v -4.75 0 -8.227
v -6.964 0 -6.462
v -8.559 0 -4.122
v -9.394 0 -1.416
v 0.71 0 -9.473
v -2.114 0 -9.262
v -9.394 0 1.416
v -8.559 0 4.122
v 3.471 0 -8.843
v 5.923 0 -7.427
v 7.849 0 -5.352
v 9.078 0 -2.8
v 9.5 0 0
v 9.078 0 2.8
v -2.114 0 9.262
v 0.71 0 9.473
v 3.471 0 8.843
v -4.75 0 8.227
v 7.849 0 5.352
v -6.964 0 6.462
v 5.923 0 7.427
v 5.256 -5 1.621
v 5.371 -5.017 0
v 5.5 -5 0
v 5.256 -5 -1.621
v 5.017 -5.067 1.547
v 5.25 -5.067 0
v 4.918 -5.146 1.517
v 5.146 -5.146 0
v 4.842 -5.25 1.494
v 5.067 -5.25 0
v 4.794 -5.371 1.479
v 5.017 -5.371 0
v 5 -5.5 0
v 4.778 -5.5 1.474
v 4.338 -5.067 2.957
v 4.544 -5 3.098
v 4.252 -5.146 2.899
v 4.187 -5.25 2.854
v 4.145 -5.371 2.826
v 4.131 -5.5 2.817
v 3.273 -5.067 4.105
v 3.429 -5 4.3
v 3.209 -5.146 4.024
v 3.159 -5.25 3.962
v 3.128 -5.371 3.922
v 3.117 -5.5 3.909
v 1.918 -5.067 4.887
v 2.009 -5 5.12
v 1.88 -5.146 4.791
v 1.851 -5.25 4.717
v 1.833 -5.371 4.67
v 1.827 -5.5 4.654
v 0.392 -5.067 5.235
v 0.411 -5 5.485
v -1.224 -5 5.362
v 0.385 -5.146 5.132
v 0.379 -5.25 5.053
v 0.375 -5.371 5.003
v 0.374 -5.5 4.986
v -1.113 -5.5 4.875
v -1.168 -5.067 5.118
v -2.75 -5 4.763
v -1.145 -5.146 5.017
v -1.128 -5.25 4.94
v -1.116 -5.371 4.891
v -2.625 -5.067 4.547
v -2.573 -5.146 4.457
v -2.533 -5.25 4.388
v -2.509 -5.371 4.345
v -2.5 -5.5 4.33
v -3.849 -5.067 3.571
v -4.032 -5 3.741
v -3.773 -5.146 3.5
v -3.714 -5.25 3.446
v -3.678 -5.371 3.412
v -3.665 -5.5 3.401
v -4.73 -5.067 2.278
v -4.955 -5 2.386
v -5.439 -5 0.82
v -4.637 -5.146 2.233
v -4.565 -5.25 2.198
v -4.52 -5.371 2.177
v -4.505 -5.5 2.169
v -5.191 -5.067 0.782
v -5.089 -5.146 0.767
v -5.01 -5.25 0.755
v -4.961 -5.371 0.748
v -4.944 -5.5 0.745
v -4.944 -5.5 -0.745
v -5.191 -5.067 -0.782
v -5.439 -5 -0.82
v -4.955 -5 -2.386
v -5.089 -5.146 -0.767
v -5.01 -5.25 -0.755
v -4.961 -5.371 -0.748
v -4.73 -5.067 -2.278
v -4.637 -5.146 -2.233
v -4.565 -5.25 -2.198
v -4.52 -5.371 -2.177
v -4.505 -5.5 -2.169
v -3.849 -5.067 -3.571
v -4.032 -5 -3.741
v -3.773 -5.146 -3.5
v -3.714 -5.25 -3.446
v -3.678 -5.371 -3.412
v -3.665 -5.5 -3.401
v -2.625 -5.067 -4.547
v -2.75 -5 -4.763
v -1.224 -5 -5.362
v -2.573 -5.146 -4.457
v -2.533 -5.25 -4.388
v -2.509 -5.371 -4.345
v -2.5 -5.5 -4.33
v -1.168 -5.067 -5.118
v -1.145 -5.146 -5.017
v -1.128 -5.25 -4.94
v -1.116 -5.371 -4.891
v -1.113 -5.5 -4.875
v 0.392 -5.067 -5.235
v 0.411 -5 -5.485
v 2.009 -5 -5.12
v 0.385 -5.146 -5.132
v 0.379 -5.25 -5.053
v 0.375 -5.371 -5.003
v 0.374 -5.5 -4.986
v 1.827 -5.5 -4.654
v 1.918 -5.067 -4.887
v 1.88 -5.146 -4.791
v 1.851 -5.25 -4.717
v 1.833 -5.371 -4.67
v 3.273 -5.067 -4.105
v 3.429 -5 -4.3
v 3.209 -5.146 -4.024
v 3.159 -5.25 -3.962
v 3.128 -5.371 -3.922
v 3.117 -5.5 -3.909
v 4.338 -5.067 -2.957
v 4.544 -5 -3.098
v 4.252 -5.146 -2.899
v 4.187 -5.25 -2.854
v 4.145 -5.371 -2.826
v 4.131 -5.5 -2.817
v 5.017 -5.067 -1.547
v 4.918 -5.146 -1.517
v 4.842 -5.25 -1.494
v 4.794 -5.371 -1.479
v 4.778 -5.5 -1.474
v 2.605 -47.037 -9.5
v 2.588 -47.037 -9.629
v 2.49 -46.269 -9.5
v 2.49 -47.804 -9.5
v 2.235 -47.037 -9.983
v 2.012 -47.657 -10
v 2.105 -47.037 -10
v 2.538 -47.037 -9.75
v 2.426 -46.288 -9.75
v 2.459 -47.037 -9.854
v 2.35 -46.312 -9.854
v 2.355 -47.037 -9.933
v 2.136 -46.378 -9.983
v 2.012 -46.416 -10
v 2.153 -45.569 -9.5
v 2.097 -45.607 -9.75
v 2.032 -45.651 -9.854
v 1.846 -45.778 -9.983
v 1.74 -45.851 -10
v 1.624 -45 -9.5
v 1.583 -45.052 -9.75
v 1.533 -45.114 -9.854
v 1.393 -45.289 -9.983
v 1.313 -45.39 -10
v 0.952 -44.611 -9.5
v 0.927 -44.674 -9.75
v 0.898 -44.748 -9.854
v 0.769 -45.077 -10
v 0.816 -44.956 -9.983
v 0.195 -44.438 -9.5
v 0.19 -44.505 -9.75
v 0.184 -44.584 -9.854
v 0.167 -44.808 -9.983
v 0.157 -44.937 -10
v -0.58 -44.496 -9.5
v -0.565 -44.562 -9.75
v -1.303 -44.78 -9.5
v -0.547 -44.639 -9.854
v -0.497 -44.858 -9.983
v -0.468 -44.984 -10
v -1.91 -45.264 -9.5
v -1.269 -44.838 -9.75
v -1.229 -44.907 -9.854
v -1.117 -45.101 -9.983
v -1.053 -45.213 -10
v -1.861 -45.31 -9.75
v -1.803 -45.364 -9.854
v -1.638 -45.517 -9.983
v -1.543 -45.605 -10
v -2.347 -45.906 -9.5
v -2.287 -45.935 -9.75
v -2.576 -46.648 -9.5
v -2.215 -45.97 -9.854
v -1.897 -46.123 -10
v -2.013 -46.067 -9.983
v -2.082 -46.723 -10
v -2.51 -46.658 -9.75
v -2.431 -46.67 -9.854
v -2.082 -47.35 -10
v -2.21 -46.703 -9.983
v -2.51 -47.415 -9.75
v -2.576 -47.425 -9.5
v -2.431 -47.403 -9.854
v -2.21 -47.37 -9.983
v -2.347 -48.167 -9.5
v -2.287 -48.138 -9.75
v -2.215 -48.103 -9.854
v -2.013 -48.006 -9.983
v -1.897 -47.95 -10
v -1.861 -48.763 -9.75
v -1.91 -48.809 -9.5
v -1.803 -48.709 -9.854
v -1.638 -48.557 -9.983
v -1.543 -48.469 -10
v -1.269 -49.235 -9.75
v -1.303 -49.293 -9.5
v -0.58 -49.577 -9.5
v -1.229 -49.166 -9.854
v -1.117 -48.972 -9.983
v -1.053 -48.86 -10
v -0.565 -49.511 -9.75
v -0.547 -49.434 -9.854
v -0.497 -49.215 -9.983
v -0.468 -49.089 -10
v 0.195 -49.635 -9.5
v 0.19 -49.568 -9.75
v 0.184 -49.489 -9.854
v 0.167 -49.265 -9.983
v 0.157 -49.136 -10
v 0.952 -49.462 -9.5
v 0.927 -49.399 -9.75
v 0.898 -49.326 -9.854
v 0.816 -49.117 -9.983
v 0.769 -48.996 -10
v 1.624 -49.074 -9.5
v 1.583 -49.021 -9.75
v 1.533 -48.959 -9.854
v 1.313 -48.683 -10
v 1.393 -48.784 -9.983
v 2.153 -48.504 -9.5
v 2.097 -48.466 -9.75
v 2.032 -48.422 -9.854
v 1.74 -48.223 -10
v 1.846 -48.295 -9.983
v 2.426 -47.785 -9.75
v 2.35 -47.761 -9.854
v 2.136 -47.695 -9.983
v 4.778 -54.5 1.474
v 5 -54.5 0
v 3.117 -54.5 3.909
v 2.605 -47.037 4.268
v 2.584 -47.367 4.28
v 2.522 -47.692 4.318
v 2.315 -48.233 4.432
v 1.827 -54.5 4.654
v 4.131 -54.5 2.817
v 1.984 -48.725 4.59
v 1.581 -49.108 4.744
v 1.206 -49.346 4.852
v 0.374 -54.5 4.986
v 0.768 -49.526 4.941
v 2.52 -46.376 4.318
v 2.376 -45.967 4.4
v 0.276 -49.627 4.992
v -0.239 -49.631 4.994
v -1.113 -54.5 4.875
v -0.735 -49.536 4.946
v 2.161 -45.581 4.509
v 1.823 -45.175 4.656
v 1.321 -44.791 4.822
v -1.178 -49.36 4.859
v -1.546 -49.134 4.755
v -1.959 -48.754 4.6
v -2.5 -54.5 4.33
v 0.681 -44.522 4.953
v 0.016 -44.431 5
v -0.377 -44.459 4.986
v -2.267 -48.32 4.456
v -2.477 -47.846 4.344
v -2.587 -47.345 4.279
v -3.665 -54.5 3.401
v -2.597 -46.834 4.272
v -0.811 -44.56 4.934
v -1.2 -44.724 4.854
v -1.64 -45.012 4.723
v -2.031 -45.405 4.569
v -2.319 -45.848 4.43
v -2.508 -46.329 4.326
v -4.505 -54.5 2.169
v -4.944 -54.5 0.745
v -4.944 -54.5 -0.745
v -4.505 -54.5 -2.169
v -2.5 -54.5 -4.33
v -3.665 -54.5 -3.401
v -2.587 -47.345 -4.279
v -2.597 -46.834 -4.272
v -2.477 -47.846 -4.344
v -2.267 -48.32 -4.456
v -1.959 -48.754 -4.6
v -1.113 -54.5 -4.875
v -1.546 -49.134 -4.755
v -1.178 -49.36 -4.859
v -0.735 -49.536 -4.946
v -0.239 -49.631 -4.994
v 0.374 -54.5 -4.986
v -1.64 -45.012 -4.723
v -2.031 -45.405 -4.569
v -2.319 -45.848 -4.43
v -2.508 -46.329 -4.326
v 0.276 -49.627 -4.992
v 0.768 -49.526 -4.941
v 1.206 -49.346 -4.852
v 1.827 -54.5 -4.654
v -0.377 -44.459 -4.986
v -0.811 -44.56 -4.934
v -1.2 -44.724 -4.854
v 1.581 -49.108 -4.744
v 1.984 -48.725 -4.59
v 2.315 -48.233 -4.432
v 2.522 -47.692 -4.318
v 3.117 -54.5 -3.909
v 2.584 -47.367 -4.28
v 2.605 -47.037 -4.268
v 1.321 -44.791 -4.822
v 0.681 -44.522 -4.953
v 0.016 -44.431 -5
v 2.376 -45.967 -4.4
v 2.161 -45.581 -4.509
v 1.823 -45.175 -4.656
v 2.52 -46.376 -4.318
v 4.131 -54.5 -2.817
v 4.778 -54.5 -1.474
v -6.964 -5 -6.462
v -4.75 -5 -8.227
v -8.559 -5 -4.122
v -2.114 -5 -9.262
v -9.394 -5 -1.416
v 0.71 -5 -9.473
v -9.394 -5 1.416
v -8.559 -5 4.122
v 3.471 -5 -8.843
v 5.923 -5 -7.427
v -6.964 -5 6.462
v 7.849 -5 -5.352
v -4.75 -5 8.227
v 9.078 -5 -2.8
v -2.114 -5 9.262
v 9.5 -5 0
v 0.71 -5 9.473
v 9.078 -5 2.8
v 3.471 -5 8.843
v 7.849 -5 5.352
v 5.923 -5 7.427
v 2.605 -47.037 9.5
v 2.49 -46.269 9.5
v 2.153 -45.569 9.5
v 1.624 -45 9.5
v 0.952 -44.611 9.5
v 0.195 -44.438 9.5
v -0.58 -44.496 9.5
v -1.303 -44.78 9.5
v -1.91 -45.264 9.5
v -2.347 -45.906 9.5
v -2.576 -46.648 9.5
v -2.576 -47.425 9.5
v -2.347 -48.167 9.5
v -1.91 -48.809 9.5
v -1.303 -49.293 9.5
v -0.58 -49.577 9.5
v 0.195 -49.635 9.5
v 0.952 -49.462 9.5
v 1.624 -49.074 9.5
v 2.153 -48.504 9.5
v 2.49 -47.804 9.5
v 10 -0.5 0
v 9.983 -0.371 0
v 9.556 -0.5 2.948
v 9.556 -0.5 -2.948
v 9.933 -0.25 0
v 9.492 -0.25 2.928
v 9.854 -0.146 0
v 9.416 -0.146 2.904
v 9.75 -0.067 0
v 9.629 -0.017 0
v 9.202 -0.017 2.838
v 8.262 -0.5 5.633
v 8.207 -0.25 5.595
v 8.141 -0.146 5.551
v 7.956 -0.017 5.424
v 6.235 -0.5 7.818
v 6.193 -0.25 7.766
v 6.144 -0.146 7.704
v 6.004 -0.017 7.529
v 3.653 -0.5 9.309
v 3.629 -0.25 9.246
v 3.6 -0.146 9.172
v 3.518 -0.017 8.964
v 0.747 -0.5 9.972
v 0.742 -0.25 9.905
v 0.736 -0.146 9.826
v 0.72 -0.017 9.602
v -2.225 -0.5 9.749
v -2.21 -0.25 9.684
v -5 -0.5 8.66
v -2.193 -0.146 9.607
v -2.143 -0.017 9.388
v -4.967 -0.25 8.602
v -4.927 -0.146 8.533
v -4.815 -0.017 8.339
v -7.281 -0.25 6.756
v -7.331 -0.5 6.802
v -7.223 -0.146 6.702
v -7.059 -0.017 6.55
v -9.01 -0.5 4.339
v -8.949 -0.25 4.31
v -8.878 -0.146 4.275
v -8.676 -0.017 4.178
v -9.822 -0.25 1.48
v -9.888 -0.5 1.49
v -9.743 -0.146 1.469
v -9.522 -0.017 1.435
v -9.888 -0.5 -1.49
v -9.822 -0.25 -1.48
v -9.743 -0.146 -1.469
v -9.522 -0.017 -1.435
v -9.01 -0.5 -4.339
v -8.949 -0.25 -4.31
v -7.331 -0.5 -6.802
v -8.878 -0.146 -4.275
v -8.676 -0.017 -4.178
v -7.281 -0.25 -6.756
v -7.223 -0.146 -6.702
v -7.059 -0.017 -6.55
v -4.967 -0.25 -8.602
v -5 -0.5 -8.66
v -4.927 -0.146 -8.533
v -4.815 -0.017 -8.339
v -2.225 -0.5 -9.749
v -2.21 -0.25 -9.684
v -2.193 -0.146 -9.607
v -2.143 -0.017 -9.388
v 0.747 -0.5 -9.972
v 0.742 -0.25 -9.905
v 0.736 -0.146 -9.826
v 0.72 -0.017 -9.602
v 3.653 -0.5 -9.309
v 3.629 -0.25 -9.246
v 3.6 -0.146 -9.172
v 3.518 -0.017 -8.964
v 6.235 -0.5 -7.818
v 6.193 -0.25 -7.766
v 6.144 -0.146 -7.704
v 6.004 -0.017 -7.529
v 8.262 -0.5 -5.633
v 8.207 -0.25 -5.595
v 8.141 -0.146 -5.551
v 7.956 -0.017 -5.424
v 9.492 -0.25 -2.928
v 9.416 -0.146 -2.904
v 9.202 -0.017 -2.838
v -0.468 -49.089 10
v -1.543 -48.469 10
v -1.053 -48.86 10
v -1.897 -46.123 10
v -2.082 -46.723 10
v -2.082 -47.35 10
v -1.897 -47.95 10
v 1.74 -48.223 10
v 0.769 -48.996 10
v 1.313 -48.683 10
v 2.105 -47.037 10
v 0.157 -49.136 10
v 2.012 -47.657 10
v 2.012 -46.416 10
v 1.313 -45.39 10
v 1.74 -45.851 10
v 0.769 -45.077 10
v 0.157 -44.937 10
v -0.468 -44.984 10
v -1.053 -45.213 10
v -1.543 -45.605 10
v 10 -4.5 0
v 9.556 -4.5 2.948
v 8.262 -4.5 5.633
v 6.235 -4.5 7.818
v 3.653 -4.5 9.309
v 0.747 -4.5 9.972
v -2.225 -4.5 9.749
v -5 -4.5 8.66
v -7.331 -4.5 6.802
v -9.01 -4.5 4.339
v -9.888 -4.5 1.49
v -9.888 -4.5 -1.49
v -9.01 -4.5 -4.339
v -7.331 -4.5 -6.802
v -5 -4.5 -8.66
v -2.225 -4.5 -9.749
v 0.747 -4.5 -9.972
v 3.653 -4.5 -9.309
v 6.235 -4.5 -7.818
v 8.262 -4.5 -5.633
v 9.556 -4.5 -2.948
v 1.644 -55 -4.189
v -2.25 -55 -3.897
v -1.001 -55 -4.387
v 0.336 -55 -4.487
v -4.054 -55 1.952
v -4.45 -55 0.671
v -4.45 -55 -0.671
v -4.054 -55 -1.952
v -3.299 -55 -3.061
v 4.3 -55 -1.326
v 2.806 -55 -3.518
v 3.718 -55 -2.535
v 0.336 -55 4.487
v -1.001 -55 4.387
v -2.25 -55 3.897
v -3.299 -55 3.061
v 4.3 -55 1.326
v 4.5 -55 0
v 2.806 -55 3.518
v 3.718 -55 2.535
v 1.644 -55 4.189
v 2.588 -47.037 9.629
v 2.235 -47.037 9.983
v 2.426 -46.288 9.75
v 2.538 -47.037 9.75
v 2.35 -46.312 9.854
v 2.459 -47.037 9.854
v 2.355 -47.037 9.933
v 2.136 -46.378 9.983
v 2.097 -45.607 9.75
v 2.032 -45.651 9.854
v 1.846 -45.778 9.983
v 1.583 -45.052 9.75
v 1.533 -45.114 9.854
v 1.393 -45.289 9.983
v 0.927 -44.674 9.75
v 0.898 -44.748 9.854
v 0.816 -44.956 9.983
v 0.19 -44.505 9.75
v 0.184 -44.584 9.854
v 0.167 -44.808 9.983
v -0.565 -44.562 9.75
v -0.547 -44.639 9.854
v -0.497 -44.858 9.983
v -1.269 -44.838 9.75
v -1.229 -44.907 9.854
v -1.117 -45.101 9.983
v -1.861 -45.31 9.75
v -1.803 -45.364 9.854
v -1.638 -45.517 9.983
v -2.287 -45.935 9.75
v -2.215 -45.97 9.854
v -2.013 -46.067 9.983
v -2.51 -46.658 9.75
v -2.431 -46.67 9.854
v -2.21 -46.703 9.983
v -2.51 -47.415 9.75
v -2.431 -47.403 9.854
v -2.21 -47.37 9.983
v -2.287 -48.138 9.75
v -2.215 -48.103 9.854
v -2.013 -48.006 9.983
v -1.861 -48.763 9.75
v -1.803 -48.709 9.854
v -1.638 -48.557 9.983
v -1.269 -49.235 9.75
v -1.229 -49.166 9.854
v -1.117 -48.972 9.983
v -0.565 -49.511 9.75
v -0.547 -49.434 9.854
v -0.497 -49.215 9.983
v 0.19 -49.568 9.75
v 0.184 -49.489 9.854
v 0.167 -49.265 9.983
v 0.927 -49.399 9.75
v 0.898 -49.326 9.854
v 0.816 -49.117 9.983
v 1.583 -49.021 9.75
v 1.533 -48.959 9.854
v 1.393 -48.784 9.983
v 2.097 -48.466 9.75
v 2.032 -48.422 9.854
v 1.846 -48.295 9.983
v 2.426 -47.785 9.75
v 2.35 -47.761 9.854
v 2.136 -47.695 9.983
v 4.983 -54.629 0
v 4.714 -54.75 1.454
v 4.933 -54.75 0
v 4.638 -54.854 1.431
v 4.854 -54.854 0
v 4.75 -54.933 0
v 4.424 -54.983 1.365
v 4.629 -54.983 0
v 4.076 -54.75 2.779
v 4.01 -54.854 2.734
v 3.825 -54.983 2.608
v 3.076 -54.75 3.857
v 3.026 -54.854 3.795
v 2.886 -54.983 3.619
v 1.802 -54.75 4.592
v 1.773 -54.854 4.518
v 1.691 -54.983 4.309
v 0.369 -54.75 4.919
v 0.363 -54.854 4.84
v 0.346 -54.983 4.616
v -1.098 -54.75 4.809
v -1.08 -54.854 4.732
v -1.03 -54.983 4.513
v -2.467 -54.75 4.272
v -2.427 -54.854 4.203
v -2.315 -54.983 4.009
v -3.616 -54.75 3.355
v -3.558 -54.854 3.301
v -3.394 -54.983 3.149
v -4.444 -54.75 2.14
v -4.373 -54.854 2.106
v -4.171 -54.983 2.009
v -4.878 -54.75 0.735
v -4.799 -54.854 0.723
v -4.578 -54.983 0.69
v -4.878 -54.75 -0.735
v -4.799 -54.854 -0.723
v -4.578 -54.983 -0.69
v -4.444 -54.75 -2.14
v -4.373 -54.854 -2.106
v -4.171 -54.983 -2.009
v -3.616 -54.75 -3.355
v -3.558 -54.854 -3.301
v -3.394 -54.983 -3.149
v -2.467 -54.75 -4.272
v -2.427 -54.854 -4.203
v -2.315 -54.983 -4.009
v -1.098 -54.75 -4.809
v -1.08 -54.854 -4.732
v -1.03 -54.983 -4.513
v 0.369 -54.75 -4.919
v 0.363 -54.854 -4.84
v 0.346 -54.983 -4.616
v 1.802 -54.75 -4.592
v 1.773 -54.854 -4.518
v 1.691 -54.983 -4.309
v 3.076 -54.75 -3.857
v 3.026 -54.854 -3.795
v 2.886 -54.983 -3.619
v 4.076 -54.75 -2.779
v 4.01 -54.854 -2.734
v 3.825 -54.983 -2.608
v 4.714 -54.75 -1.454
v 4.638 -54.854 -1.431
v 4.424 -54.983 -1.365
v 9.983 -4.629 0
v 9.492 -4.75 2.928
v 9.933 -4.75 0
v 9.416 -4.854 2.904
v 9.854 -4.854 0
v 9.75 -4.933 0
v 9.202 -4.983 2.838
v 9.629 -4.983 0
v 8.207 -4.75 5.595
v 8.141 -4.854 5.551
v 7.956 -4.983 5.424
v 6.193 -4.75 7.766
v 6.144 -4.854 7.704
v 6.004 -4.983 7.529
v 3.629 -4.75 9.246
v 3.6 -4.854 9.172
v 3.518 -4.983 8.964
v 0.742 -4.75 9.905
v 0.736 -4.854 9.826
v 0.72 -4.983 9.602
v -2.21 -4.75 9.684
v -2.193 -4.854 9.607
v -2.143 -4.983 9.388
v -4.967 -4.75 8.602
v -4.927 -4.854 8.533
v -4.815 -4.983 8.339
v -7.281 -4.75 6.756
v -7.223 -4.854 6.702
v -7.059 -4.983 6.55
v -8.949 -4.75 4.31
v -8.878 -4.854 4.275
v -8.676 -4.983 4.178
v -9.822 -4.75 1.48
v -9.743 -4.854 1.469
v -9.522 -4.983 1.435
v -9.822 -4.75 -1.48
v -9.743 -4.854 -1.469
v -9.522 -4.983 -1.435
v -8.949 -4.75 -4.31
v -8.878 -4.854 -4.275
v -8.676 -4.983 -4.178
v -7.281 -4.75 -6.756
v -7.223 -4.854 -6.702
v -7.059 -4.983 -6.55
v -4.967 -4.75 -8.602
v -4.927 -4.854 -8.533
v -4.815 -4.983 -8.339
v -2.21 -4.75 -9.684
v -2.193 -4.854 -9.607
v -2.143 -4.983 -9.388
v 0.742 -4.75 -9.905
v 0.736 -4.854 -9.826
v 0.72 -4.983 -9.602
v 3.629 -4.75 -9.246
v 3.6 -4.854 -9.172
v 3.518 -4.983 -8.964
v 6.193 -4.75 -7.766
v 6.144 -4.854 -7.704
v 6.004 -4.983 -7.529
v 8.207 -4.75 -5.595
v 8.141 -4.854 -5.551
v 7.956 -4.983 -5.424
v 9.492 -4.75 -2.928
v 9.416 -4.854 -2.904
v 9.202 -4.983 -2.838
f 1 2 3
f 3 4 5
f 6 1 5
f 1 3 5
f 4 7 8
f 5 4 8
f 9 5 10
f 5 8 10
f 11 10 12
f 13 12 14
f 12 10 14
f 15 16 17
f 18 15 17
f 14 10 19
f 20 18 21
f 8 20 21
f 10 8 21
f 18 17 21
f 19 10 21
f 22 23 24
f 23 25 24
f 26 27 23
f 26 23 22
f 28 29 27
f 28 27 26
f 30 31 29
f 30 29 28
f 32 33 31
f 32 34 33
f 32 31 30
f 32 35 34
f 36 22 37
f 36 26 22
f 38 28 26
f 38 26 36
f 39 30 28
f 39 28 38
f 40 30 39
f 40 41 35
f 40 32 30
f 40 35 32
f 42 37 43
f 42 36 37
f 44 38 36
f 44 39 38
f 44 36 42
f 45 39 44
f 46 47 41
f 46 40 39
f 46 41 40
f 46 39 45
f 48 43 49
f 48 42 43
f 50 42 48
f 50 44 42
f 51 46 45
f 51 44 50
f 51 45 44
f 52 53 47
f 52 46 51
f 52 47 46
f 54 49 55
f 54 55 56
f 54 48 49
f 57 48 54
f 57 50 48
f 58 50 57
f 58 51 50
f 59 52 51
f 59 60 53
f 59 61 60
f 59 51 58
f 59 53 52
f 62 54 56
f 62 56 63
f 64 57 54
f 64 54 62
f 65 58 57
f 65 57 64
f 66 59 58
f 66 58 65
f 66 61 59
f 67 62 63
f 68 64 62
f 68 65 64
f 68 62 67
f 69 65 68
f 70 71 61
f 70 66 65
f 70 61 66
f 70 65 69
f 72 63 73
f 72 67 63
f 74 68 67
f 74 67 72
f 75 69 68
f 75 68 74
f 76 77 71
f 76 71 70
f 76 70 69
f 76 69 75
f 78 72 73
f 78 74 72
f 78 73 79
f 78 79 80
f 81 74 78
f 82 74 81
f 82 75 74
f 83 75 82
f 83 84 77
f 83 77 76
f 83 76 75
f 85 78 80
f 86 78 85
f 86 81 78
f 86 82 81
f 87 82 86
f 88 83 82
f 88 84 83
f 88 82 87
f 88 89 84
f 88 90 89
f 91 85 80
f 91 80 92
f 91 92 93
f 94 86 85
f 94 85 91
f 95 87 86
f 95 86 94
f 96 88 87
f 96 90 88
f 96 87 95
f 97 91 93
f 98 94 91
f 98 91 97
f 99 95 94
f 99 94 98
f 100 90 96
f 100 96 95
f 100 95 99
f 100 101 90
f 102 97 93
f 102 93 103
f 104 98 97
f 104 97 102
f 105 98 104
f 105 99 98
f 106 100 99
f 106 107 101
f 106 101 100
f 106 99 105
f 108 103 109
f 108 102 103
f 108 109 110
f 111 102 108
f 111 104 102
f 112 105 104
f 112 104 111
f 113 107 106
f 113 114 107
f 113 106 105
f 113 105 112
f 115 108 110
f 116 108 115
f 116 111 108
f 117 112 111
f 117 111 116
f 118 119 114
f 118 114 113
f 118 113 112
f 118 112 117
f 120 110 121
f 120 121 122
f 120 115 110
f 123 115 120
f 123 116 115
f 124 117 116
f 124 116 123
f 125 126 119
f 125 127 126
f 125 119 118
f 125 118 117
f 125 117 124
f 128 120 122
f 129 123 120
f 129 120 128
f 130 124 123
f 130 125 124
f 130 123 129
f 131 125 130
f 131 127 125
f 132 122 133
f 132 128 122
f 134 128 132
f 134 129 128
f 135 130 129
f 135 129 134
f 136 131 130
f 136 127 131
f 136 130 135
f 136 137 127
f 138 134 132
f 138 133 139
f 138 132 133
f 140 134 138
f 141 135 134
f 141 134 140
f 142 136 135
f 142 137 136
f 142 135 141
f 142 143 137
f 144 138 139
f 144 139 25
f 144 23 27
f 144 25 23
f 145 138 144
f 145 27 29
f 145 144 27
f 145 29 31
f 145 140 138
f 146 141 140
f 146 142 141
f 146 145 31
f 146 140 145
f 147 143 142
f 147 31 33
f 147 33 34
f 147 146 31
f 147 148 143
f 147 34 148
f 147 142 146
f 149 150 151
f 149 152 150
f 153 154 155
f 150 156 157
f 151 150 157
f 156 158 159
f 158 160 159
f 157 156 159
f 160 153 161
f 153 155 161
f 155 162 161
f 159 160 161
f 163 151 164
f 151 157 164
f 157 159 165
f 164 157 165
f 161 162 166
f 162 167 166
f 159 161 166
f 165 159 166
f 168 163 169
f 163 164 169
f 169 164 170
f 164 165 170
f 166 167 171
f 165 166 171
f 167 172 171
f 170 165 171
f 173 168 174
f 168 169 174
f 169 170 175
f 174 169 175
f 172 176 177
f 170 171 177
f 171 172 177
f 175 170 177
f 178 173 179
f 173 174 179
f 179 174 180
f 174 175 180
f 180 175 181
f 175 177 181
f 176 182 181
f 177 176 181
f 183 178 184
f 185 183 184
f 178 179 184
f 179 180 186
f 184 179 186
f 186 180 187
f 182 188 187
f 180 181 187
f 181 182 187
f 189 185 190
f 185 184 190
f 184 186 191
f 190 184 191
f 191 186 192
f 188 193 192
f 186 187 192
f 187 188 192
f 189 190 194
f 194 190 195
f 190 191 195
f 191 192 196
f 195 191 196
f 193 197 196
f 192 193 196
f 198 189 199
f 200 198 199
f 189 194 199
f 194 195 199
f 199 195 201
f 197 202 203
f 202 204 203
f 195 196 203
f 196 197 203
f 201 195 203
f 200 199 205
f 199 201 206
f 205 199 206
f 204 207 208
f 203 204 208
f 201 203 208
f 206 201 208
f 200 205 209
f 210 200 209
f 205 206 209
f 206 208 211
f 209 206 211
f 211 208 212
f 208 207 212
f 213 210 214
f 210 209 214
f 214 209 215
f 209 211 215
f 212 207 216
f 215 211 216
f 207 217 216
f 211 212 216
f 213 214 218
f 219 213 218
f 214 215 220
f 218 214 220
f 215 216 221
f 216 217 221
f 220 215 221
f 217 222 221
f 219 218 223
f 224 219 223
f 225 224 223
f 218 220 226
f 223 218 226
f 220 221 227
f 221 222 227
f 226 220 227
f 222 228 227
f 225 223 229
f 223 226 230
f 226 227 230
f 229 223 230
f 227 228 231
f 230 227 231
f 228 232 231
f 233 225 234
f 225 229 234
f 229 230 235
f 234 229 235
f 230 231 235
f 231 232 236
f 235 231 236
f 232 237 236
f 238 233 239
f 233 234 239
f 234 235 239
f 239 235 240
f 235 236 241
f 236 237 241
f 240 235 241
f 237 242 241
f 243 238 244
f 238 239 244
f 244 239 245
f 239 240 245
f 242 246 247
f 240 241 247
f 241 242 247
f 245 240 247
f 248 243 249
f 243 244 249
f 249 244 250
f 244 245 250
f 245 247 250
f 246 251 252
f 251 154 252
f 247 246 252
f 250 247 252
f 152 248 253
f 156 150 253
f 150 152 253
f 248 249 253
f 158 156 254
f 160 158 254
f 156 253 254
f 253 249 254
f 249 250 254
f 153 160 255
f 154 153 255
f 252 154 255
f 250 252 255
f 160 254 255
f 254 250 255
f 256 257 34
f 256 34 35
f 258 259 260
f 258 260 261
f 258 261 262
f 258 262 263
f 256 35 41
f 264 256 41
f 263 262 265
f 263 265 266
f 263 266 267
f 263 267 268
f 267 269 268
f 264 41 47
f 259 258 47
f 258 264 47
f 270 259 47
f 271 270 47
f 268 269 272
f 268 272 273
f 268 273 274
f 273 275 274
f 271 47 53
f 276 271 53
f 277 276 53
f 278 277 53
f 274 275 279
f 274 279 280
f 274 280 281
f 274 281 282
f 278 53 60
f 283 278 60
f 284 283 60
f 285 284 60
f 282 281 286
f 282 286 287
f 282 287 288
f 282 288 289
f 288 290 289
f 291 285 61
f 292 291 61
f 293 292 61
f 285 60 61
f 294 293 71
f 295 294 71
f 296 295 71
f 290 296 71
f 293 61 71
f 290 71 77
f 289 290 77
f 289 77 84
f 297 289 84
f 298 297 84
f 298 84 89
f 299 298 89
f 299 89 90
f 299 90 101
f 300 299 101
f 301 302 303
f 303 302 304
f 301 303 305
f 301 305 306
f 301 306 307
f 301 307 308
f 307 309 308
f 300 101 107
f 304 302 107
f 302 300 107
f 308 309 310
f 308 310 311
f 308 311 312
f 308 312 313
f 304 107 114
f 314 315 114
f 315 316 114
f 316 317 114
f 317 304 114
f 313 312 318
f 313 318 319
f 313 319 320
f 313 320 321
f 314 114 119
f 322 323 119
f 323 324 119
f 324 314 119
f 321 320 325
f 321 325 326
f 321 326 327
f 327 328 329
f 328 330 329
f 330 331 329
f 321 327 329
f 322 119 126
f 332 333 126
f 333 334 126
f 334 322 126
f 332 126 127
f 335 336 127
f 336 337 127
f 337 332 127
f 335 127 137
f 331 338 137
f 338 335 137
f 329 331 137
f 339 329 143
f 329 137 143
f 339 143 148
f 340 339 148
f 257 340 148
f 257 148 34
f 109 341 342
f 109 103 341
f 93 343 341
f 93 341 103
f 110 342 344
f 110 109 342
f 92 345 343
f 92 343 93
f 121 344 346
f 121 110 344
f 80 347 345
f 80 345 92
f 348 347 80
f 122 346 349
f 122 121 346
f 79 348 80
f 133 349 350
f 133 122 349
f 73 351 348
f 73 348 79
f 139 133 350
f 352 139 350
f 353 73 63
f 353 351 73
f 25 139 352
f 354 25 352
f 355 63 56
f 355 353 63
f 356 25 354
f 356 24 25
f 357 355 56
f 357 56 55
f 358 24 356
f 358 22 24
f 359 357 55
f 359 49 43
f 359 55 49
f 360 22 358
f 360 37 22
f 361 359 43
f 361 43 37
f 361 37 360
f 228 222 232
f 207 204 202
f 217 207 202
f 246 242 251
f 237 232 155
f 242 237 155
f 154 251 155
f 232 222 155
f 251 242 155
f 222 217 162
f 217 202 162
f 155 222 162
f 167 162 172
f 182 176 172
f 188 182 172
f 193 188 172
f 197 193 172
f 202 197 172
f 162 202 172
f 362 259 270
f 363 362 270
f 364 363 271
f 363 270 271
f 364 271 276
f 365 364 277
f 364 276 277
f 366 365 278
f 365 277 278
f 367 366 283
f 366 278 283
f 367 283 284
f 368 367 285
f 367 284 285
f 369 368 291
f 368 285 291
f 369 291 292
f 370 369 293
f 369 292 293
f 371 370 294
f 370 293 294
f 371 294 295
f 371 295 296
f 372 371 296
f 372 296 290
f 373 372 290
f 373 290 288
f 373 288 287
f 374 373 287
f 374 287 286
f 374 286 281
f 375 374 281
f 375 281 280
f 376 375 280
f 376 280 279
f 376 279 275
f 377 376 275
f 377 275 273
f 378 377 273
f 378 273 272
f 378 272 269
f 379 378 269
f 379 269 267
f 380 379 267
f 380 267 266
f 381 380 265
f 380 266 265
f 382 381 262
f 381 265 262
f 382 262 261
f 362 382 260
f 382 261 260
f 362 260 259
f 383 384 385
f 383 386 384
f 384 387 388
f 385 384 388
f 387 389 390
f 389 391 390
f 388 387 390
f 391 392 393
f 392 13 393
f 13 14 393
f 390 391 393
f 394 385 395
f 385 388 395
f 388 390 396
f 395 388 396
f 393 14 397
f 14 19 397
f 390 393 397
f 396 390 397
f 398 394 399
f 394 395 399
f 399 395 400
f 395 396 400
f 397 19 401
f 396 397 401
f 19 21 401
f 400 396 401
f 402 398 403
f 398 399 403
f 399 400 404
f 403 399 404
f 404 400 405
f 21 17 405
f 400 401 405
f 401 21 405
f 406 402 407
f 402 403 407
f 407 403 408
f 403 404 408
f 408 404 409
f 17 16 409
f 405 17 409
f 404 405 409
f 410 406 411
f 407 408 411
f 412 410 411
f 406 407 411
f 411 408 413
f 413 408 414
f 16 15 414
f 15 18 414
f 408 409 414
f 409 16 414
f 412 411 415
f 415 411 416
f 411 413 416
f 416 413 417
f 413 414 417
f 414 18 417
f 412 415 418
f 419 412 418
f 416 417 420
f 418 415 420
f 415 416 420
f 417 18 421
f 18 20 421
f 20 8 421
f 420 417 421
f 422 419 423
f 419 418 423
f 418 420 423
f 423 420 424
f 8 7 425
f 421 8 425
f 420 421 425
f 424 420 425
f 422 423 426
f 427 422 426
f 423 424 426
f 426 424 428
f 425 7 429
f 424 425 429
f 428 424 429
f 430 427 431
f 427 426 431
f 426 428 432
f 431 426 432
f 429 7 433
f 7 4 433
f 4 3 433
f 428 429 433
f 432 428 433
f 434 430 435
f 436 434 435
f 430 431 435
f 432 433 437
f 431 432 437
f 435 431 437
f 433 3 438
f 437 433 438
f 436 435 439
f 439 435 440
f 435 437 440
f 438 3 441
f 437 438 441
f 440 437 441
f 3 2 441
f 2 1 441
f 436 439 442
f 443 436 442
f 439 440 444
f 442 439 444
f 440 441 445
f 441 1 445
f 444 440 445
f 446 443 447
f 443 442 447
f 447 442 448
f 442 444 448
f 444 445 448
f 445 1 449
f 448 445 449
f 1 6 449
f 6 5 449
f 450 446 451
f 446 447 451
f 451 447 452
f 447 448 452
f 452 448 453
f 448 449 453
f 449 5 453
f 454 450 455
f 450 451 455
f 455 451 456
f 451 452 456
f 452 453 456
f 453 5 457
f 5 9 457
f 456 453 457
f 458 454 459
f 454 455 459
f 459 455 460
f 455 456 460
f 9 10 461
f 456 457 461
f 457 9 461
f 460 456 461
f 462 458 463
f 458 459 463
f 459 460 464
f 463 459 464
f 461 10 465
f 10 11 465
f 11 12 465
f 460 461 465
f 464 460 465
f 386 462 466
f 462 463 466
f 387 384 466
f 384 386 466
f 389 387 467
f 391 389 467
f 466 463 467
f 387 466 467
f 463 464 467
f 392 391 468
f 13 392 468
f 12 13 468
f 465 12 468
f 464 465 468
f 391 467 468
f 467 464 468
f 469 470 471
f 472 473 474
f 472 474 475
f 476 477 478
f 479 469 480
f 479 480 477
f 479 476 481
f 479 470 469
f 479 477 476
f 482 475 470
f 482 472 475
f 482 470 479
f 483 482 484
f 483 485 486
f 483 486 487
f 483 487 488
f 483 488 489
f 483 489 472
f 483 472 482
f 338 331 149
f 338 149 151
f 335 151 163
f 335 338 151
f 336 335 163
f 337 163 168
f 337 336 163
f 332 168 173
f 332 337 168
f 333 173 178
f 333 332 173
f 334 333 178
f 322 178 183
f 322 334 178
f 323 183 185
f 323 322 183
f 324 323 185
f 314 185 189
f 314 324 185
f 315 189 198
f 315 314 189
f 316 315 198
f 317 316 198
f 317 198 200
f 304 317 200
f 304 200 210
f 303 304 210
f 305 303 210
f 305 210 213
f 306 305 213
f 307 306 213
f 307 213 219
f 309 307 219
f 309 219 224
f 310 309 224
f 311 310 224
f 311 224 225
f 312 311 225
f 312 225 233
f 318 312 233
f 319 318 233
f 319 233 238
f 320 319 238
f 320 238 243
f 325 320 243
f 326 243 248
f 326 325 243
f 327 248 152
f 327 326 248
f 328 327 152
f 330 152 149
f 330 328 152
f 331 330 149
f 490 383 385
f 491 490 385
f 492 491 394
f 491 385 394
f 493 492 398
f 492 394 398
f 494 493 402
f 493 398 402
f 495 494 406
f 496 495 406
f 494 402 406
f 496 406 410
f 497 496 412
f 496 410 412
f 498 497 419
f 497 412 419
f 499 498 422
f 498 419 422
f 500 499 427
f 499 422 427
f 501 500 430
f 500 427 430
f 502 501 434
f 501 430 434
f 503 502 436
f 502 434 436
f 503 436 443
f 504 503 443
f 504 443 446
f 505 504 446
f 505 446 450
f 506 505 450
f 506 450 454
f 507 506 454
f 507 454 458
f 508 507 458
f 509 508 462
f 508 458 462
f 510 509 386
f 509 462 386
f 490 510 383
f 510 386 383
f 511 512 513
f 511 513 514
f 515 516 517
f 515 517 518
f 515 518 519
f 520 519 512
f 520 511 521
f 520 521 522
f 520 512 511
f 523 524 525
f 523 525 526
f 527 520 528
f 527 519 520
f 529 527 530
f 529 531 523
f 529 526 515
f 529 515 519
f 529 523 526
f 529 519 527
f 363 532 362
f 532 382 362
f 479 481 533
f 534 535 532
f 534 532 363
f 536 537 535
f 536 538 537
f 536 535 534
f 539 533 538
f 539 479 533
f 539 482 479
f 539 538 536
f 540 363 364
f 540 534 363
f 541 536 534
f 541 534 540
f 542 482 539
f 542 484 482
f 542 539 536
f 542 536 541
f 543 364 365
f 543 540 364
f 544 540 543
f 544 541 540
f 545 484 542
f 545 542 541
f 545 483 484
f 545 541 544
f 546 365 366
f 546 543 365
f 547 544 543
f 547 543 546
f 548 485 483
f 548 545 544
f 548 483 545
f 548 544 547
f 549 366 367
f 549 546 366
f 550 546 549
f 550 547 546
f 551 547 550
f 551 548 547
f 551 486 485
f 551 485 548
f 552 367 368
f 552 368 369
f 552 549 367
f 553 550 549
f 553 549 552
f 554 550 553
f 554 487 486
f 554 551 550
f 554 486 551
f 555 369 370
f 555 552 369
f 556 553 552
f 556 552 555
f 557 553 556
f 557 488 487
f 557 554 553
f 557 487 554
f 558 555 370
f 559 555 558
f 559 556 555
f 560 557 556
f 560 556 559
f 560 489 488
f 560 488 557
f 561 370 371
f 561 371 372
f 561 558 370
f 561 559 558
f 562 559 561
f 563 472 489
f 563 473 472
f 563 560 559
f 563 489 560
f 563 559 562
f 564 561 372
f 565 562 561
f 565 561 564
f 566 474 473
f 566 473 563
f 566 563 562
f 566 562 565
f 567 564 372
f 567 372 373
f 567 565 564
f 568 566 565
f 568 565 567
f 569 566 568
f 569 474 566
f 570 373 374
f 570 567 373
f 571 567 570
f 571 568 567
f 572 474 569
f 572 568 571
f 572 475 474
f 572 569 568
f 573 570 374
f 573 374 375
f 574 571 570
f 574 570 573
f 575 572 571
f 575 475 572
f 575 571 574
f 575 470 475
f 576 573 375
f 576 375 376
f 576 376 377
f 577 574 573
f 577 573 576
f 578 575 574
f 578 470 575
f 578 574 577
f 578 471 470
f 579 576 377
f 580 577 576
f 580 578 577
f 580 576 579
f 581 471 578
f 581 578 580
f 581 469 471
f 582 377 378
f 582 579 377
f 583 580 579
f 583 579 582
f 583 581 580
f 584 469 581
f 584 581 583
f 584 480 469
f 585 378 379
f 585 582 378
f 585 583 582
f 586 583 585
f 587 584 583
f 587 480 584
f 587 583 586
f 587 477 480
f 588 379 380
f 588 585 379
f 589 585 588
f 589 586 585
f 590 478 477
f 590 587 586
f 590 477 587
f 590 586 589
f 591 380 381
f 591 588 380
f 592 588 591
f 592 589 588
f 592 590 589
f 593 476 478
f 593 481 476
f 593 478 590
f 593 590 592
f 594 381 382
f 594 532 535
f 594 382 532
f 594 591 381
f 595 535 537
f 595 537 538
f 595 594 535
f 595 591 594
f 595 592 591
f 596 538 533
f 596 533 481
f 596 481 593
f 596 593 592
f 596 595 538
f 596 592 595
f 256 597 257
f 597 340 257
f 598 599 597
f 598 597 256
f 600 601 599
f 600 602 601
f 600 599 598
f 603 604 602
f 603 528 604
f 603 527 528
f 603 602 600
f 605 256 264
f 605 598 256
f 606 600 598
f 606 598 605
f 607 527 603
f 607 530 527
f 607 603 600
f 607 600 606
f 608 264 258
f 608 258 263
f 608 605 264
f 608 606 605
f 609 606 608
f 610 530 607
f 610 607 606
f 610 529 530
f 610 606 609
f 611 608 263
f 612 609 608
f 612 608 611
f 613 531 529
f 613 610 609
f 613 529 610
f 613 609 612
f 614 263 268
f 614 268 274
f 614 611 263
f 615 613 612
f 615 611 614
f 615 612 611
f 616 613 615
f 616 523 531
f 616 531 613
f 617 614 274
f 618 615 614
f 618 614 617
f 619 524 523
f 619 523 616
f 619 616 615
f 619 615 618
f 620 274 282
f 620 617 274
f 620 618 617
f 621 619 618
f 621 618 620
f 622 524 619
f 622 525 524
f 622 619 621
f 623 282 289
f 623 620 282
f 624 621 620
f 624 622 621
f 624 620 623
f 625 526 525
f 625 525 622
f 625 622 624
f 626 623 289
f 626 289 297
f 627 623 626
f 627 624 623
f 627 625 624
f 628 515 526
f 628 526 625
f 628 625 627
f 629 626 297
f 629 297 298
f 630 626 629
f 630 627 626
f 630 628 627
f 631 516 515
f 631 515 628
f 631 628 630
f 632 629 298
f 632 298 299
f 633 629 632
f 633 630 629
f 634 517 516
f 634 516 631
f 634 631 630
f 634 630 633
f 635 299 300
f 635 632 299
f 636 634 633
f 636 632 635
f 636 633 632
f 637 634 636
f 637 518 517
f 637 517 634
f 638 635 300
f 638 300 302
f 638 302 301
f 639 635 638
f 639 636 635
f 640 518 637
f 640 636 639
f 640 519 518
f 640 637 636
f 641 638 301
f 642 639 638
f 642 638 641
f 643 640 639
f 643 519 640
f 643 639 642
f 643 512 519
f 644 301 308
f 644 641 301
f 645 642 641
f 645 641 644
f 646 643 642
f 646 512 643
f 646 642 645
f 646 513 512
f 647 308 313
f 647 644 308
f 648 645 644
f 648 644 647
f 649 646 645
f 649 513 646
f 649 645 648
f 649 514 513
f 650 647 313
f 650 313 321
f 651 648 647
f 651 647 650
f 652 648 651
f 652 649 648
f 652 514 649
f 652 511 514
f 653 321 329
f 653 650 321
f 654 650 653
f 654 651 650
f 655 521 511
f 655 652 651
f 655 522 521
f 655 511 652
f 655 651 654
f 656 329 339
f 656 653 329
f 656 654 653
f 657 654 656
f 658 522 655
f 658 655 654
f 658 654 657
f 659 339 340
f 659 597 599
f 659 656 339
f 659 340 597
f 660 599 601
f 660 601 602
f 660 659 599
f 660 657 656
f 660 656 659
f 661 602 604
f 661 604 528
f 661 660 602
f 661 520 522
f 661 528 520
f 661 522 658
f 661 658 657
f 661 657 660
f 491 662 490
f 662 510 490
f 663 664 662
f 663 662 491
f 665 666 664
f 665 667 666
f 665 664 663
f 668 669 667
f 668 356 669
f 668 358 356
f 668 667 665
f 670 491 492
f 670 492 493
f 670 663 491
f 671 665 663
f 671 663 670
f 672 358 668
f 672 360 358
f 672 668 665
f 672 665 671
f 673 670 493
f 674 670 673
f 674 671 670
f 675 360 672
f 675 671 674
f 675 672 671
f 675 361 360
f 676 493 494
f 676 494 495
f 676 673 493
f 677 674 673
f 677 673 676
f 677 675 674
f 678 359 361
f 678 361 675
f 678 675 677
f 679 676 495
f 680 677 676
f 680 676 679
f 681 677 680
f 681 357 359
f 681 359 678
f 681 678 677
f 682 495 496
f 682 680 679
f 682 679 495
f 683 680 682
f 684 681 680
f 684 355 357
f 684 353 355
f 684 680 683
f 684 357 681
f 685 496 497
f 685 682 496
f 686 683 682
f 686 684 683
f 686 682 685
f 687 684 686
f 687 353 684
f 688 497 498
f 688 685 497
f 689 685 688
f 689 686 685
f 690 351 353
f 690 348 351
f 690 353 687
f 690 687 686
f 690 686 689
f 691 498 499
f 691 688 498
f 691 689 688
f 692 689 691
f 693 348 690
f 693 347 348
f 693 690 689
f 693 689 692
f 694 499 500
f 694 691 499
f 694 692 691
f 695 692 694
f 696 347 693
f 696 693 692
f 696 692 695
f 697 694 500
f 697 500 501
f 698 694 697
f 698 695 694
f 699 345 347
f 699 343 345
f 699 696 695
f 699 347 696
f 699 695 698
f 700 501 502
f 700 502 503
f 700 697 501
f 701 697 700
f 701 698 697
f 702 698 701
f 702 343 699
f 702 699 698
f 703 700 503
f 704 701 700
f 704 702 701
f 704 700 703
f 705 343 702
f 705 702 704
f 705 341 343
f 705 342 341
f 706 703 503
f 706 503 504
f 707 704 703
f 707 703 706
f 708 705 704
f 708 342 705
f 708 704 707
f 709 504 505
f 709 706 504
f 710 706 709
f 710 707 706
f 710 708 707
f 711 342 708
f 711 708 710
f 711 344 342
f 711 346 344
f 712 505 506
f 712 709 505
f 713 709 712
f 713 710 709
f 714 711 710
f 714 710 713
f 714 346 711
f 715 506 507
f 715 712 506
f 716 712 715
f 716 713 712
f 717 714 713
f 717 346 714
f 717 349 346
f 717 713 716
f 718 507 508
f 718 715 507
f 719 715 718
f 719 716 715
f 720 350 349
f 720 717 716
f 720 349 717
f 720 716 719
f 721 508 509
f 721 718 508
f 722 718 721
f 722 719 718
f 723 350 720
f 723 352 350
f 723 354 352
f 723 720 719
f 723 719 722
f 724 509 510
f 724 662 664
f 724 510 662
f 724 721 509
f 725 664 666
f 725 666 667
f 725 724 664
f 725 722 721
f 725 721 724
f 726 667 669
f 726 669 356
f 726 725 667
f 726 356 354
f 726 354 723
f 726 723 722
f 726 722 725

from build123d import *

# Parameters (mm, degrees)
F0_R          = 10
F1_DEPTH      = 5
F2_R          = 5
F3_DEPTH      = 50
F4_R          = 0.5
F5_R          = 2.605382
F6_DEPTH      = 10
F6_DEPTH_BACK = 10
F7_R          = 0.5


with BuildPart() as f1:
    # F0 (on Front) → F1 (new body)
    with BuildSketch(Plane.XZ):
        Circle(F0_R)
    extrude(amount=F1_DEPTH)

    # F2 (on face) → F3 (join)
    with BuildSketch(Plane.XZ.offset(5)):
        Circle(F2_R)
    extrude(amount=F3_DEPTH)

    # F4
    f4_edges = [f1.edges().sort_by_distance(p)[0] for p in [
        (-10, -5, 0),
        (-10, 0, 0),
        (-5, -5, 0),
        (-5, -55, 0),
    ]]
    fillet(f4_edges, radius=F4_R)

    # F5 (on Top) → F6 (join, two sides)
    with BuildSketch(Plane.XY) as f6_sk:
        with Locations((0, -47.036547)):
            Circle(F5_R)
    extrude(amount=F6_DEPTH)
    extrude(f6_sk.sketch, amount=-F6_DEPTH_BACK)

    # F7
    f7_edges = [f1.edges().sort_by_distance(p)[0] for p in [
        (-2.605382, -47.036547, 10),
        (-2.605382, -47.036547, -10),
    ]]
    fillet(f7_edges, radius=F7_R)


solid = f1.part
